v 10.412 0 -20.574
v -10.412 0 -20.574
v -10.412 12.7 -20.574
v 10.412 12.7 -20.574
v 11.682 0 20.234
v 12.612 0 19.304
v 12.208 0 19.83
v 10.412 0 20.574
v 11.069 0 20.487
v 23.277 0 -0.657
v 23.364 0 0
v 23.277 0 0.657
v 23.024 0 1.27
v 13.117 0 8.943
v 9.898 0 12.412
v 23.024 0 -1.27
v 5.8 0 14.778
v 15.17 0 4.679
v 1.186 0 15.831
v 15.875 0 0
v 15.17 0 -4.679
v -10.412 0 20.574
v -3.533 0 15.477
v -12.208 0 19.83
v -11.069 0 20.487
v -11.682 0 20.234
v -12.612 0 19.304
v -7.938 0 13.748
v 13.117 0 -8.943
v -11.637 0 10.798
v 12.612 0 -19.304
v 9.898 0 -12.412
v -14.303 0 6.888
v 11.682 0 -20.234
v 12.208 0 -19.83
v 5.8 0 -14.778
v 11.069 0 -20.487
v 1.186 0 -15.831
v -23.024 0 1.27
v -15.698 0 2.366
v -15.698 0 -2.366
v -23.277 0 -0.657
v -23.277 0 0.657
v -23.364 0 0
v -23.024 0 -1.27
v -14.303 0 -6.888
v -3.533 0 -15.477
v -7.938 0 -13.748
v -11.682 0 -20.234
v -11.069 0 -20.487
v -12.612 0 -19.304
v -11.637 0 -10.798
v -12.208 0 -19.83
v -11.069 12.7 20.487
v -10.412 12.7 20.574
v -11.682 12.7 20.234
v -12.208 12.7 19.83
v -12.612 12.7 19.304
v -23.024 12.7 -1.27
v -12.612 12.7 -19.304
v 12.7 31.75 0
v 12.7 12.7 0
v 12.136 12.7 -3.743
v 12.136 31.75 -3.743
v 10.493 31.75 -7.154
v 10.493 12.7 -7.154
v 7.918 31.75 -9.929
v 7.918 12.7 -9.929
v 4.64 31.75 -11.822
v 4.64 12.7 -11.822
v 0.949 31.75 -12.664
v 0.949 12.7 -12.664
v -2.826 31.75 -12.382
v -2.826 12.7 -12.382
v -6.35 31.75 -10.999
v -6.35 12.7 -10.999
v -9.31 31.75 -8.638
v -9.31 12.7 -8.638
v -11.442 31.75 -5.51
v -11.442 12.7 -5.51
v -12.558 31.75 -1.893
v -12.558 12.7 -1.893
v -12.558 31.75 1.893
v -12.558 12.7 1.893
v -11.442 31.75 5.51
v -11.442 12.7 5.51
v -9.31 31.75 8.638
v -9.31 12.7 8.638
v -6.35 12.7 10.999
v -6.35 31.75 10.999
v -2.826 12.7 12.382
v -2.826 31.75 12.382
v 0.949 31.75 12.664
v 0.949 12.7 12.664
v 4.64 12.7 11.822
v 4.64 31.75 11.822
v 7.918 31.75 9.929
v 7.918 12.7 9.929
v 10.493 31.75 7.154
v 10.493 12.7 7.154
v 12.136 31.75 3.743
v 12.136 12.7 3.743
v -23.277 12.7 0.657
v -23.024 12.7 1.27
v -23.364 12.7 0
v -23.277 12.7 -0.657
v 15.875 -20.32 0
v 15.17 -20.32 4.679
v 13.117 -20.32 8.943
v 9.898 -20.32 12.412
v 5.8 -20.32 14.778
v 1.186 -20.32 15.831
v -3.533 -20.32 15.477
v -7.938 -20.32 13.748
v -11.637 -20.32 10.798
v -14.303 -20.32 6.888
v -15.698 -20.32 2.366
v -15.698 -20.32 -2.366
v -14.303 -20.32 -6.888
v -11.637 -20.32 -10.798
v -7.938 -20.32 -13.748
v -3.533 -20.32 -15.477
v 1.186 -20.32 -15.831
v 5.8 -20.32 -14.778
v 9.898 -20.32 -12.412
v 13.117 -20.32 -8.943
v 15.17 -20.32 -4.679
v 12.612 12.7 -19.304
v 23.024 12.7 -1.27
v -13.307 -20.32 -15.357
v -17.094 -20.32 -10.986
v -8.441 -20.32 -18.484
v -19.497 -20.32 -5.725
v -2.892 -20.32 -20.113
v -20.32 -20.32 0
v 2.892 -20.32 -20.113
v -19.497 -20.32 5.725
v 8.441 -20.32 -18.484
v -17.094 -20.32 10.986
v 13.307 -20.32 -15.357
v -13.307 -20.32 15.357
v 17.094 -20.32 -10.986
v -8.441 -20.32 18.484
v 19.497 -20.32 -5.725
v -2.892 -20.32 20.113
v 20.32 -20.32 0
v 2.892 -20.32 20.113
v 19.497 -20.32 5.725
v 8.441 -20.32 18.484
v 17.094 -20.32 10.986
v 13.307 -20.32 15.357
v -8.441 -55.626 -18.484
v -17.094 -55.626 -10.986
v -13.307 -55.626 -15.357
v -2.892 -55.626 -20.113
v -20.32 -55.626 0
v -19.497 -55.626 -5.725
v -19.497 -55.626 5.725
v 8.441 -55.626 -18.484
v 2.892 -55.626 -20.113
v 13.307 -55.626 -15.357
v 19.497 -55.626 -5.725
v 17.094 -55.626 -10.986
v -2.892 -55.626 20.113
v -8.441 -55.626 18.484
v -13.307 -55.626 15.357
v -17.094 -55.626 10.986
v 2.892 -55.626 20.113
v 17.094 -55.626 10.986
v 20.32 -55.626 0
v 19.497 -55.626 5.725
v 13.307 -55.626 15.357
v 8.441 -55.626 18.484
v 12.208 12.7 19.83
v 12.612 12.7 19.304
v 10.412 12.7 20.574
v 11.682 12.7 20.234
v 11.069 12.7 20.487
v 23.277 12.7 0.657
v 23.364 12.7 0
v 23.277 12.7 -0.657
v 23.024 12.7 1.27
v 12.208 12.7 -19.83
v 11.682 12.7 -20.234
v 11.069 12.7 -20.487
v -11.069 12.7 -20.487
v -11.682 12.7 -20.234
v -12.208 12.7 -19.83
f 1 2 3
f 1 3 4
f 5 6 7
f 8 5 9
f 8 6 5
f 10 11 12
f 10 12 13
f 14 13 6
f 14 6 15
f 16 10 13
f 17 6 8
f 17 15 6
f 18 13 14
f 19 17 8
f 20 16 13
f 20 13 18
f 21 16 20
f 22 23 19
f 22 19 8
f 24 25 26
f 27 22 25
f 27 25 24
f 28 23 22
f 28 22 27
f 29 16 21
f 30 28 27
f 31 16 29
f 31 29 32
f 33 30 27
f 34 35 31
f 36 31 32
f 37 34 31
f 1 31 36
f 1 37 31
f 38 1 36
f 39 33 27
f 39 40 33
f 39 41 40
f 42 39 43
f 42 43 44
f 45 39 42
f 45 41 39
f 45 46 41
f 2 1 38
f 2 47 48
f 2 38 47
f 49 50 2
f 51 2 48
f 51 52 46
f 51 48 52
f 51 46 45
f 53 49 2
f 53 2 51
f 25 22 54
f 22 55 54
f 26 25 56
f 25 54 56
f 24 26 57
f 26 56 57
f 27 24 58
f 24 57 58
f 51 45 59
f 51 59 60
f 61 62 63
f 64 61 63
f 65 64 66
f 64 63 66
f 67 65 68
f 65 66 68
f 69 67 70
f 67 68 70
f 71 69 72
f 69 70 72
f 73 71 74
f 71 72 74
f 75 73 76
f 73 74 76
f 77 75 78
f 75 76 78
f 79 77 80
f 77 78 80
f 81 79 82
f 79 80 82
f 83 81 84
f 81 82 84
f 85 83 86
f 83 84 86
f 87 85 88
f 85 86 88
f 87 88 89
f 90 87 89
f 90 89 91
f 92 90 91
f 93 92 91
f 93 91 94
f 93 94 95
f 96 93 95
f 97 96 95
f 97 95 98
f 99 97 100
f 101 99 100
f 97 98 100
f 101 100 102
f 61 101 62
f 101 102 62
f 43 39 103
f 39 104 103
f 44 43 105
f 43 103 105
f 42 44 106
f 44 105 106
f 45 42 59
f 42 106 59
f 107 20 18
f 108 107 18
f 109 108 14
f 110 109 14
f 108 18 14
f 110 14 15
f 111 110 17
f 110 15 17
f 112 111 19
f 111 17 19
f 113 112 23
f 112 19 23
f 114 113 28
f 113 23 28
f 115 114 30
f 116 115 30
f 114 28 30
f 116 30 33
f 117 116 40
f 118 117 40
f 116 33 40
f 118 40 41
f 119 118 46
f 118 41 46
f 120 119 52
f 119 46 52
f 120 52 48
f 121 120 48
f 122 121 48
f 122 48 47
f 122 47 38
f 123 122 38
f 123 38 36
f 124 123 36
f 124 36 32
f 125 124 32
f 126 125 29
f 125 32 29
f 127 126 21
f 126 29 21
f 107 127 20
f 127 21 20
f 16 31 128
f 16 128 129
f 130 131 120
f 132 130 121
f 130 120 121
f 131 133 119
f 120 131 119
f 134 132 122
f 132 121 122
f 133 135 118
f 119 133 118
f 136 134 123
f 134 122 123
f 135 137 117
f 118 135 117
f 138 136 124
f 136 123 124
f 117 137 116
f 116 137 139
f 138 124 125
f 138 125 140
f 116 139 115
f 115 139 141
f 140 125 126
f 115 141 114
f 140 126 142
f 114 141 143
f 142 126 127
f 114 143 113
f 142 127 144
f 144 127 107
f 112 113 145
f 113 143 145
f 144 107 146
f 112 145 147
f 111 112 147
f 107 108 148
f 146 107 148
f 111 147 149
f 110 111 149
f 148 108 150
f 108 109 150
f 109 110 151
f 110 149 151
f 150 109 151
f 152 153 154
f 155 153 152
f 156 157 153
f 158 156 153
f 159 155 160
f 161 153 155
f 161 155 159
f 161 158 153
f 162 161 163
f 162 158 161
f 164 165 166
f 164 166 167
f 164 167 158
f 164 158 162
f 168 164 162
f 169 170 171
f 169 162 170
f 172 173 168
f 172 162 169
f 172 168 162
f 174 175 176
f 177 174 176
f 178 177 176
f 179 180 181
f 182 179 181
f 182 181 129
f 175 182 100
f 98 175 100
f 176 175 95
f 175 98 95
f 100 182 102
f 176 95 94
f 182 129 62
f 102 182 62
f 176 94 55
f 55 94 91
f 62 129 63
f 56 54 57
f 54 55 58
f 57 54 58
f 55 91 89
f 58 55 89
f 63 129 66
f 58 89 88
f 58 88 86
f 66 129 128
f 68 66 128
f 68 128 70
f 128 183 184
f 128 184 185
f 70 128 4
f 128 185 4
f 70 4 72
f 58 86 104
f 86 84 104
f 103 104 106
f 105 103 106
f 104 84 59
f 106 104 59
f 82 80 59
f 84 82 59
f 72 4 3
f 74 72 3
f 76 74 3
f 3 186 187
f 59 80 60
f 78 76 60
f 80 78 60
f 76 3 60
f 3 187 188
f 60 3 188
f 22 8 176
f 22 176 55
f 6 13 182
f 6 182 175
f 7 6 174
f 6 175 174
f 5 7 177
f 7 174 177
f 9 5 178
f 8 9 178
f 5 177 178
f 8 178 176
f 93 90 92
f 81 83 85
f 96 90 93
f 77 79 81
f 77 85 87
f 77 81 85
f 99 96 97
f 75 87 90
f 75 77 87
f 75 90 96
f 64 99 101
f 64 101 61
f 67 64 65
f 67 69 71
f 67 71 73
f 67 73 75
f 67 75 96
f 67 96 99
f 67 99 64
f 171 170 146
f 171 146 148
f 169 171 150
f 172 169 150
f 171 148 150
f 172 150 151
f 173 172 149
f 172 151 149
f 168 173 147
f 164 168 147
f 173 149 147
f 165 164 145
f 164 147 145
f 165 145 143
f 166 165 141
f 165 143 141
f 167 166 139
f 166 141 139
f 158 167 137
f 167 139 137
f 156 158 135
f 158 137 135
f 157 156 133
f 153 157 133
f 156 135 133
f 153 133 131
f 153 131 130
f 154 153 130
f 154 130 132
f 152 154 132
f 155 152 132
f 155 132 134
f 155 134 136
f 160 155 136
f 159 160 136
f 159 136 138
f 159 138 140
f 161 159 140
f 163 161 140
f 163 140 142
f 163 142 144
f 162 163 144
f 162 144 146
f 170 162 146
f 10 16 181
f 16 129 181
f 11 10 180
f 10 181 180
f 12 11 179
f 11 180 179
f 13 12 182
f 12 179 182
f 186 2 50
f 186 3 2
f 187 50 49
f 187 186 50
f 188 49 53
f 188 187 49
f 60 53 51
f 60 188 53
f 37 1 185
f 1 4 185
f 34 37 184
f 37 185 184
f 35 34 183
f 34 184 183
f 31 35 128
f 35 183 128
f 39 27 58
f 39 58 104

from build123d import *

# Parameters (mm, degrees)
BOSS_EXTRUDE1_DEPTH = 12.7
FILLET1_R           = 2.54
SKETCH2_R           = 20.32
BOSS_EXTRUDE4_DEPTH = 55.626
SKETCH4_R           = 20.32
SKETCH4_R_2         = 15.875
CUT_EXTRUDE1_DEPTH  = 20.32
SKETCH5_R           = 12.7
BOSS_EXTRUDE5_DEPTH = 19.05


with BuildPart() as part:
    # Sketch1 → Boss-Extrude1 (new body)
    with BuildSketch(Plane(origin=(0, 0, 0), x_dir=(1, 0, 0), z_dir=(0, 1, 0))):
        Polygon((-11.878404438, 20.574), (11.878404438, 20.574), (23.756808877, 0), (11.878404438, -20.574), (-11.878404438, -20.574), (-23.756808877, 0), align=None)
    extrude(amount=BOSS_EXTRUDE1_DEPTH)

    # Fillet1
    fillet1_edges = [part.edges().sort_by_distance(p)[0] for p in [
        (-11.878404438, 6.35, -20.574),
        (11.878404438, 6.35, -20.574),
        (23.756808877, 6.35, 0),
        (11.878404438, 6.35, 20.574),
        (-11.878404438, 6.35, 20.574),
        (-23.756808877, 6.35, 0),
    ]]
    fillet(fillet1_edges, radius=FILLET1_R)

    # Sketch2 → Boss-Extrude4 (add)
    with BuildSketch(Plane.XZ):
        Circle(SKETCH2_R)
    extrude(amount=BOSS_EXTRUDE4_DEPTH)

    # Sketch4 → Cut-Extrude1 (cut)
    with BuildSketch(Plane.XZ):
        Circle(SKETCH4_R)
        Circle(SKETCH4_R_2, mode=Mode.SUBTRACT)
    extrude(amount=CUT_EXTRUDE1_DEPTH, mode=Mode.SUBTRACT)

    # Sketch5 → Boss-Extrude5 (add)
    with BuildSketch(Plane(origin=(0, 12.7, 0), x_dir=(1, 0, 0), z_dir=(0, 1, 0))):
        Circle(SKETCH5_R)
    extrude(amount=BOSS_EXTRUDE5_DEPTH)


solid = part.part
